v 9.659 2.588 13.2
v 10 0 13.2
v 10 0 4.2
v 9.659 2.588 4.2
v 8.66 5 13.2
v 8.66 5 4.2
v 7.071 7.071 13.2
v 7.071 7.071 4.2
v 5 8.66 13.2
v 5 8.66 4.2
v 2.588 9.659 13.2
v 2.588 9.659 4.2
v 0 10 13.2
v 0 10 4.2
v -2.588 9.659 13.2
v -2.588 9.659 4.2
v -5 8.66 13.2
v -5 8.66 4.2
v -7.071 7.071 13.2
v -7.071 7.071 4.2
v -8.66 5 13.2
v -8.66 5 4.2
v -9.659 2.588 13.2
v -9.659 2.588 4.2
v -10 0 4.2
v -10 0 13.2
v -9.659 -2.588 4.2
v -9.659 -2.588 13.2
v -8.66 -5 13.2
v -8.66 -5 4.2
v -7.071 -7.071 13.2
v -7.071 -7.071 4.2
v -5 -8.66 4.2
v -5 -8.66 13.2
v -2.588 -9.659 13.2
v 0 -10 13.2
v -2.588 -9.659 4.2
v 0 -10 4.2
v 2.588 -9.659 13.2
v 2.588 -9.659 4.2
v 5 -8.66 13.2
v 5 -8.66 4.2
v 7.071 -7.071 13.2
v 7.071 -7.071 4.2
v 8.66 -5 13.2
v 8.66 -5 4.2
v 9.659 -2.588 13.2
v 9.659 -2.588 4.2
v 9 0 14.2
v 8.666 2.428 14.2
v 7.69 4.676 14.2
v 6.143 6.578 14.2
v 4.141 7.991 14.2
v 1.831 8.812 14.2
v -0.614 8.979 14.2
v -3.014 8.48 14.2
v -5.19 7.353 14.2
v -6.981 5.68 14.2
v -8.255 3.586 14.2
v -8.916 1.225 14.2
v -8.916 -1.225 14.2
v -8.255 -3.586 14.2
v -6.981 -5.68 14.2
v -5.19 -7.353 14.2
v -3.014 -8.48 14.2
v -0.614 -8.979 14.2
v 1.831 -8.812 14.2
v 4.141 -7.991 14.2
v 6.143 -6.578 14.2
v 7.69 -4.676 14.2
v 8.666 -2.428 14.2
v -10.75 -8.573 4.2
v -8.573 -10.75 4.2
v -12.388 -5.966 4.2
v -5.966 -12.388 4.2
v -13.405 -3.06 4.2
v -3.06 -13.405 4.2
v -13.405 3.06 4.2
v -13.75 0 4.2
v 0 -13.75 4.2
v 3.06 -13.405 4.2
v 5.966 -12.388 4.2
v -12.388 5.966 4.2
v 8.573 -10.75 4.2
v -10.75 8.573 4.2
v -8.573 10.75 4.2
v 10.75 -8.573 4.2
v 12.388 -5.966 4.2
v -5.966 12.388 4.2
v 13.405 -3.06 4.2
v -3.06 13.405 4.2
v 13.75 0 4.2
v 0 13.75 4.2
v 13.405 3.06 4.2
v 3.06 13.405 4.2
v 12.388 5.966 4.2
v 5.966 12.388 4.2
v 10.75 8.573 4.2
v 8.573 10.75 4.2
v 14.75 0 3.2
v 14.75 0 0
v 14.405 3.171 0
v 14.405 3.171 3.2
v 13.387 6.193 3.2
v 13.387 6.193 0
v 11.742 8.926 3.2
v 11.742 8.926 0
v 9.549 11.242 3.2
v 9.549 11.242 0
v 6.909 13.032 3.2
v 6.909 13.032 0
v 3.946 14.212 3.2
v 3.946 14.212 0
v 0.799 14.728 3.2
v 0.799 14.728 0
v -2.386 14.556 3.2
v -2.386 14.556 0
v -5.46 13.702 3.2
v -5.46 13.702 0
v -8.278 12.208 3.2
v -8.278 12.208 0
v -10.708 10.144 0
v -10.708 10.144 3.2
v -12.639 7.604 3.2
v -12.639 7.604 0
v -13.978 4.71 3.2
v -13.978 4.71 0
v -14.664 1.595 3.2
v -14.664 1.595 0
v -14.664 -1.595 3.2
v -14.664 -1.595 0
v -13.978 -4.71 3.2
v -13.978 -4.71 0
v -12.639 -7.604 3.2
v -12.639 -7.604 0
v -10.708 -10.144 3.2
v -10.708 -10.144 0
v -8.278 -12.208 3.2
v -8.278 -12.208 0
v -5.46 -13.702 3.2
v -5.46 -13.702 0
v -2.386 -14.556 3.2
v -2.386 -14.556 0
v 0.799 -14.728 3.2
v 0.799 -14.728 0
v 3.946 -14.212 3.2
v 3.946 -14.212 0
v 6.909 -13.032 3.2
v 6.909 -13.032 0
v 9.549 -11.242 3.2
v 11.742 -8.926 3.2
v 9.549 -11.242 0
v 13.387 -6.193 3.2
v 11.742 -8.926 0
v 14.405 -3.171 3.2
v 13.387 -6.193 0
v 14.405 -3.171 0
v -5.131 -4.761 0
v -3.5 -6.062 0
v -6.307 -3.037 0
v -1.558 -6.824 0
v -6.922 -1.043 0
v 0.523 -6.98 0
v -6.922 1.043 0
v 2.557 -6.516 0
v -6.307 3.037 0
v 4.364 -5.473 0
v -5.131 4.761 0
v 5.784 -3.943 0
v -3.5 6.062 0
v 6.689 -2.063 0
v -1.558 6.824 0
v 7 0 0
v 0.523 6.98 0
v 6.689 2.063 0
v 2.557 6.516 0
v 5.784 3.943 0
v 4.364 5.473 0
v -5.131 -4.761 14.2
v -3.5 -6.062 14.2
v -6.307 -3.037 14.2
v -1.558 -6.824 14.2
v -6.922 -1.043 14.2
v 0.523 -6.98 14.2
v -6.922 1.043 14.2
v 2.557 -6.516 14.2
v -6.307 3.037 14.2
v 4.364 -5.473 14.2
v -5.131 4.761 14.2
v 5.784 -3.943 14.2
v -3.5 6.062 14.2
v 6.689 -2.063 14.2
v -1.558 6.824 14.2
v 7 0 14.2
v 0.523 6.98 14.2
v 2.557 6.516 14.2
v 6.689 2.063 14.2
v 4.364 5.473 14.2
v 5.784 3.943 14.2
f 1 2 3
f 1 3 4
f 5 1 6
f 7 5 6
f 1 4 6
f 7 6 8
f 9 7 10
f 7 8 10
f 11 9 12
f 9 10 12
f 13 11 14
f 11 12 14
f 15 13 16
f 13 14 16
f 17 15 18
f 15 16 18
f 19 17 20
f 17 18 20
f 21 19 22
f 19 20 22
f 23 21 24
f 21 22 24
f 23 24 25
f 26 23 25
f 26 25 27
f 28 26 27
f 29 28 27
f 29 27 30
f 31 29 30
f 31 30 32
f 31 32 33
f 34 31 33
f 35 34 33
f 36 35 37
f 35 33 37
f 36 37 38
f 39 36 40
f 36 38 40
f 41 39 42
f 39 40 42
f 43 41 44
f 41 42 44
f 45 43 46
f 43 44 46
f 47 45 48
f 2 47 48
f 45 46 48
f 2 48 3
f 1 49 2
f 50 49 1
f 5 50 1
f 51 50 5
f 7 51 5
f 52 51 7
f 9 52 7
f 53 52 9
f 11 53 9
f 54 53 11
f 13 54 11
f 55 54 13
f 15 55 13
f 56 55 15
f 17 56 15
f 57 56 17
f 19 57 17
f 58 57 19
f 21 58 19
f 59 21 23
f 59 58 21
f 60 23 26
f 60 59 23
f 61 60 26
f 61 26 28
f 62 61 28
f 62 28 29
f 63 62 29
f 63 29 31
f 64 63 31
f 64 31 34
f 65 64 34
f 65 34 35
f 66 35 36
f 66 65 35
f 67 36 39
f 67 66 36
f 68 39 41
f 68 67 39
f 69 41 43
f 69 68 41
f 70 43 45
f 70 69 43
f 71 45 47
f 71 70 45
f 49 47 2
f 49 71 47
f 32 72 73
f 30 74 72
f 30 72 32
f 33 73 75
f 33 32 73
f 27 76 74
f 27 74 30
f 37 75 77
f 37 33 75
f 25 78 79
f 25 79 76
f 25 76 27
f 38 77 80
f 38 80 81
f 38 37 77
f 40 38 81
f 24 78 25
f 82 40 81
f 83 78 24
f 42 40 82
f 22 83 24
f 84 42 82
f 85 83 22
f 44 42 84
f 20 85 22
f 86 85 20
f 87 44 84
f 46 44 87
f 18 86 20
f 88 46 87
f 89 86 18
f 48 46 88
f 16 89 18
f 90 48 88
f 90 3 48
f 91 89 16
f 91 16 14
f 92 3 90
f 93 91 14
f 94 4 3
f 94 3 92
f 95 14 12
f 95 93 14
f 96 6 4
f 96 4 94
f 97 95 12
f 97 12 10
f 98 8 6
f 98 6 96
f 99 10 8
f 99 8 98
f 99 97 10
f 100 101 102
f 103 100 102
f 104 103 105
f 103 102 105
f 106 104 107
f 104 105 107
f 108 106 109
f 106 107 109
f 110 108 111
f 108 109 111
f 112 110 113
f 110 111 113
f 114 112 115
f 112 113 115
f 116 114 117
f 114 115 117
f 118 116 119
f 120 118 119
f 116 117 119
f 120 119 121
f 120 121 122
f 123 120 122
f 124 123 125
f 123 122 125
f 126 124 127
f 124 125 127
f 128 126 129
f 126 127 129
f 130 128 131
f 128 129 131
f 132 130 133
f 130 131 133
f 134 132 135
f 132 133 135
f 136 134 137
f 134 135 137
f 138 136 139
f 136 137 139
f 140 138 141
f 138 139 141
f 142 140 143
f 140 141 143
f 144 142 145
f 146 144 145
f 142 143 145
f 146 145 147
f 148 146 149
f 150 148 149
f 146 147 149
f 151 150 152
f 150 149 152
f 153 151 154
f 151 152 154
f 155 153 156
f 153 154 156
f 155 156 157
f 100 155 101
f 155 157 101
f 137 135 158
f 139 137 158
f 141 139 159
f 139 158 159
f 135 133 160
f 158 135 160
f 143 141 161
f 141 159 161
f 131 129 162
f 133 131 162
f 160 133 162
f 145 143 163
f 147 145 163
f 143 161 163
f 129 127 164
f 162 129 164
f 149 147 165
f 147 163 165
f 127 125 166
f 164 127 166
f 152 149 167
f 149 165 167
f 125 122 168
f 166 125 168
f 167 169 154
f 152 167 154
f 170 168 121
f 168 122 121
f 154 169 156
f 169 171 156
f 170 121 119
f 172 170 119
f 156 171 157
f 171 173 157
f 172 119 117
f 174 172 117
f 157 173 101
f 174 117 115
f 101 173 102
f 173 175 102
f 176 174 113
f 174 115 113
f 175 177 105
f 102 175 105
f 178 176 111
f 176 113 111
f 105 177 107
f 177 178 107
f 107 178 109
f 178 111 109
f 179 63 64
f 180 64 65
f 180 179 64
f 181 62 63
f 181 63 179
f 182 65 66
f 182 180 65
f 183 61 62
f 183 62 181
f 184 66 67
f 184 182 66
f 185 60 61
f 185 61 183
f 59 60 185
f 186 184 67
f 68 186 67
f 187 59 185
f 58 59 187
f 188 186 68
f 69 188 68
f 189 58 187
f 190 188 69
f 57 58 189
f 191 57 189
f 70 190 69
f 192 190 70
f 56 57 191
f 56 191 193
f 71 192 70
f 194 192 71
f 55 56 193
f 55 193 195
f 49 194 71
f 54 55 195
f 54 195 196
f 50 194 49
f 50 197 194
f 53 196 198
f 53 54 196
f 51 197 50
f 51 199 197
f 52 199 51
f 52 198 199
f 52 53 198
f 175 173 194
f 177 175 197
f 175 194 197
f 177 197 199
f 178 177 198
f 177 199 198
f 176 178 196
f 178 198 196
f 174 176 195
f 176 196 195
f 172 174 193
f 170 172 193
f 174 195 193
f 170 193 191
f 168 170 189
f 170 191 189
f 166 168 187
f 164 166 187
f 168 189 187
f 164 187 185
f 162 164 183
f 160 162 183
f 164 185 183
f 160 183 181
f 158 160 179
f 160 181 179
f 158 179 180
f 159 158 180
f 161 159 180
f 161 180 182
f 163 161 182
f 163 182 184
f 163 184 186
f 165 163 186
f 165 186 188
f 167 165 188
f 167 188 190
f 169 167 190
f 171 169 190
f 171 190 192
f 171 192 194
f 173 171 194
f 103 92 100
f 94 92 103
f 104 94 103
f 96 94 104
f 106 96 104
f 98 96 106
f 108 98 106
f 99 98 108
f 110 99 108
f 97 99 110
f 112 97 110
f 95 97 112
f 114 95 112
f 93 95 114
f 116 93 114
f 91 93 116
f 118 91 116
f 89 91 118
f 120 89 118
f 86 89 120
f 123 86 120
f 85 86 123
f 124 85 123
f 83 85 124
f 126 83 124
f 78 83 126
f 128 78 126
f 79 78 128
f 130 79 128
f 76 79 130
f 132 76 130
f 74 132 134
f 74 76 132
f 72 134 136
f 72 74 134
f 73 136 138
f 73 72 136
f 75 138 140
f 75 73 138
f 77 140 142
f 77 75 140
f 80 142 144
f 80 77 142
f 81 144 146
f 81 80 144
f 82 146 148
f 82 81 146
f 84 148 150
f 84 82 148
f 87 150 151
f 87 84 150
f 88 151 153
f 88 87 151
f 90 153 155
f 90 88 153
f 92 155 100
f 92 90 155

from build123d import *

# Parameters (mm, degrees)
SKETCH_1_R          = 14.75
EXTRUDE_1_DEPTH     = 4.2
SKETCH_2_R          = 10
EXTRUDE_2_DEPTH     = 10
SKETCH_3_R          = 7
CUT_EXTRUDE_1_DEPTH = 15.2
CHAMFER_1_SIZE      = 1


with BuildPart() as part:
    # 草图1 → 凸台-拉伸1 (new body)
    with BuildSketch(Plane.XY):
        Circle(SKETCH_1_R)
    extrude(amount=EXTRUDE_1_DEPTH)

    # 草图2 → 凸台-拉伸2 (add)
    with BuildSketch(Plane.XY.offset(4.2)):
        Circle(SKETCH_2_R)
    extrude(amount=EXTRUDE_2_DEPTH)

    # 草图3 → 切除-拉伸1 (cut, through all)
    with BuildSketch(Plane.XY.offset(14.2)):
        Circle(SKETCH_3_R)
    extrude(amount=-CUT_EXTRUDE_1_DEPTH, mode=Mode.SUBTRACT)

    # 倒角1
    chamfer_1_edges = [part.edges().sort_by_distance(p)[0] for p in [
        (-14.75, 0, 4.2),
        (-10, 0, 14.2),
    ]]
    chamfer(chamfer_1_edges, length=CHAMFER_1_SIZE)


solid = part.part
